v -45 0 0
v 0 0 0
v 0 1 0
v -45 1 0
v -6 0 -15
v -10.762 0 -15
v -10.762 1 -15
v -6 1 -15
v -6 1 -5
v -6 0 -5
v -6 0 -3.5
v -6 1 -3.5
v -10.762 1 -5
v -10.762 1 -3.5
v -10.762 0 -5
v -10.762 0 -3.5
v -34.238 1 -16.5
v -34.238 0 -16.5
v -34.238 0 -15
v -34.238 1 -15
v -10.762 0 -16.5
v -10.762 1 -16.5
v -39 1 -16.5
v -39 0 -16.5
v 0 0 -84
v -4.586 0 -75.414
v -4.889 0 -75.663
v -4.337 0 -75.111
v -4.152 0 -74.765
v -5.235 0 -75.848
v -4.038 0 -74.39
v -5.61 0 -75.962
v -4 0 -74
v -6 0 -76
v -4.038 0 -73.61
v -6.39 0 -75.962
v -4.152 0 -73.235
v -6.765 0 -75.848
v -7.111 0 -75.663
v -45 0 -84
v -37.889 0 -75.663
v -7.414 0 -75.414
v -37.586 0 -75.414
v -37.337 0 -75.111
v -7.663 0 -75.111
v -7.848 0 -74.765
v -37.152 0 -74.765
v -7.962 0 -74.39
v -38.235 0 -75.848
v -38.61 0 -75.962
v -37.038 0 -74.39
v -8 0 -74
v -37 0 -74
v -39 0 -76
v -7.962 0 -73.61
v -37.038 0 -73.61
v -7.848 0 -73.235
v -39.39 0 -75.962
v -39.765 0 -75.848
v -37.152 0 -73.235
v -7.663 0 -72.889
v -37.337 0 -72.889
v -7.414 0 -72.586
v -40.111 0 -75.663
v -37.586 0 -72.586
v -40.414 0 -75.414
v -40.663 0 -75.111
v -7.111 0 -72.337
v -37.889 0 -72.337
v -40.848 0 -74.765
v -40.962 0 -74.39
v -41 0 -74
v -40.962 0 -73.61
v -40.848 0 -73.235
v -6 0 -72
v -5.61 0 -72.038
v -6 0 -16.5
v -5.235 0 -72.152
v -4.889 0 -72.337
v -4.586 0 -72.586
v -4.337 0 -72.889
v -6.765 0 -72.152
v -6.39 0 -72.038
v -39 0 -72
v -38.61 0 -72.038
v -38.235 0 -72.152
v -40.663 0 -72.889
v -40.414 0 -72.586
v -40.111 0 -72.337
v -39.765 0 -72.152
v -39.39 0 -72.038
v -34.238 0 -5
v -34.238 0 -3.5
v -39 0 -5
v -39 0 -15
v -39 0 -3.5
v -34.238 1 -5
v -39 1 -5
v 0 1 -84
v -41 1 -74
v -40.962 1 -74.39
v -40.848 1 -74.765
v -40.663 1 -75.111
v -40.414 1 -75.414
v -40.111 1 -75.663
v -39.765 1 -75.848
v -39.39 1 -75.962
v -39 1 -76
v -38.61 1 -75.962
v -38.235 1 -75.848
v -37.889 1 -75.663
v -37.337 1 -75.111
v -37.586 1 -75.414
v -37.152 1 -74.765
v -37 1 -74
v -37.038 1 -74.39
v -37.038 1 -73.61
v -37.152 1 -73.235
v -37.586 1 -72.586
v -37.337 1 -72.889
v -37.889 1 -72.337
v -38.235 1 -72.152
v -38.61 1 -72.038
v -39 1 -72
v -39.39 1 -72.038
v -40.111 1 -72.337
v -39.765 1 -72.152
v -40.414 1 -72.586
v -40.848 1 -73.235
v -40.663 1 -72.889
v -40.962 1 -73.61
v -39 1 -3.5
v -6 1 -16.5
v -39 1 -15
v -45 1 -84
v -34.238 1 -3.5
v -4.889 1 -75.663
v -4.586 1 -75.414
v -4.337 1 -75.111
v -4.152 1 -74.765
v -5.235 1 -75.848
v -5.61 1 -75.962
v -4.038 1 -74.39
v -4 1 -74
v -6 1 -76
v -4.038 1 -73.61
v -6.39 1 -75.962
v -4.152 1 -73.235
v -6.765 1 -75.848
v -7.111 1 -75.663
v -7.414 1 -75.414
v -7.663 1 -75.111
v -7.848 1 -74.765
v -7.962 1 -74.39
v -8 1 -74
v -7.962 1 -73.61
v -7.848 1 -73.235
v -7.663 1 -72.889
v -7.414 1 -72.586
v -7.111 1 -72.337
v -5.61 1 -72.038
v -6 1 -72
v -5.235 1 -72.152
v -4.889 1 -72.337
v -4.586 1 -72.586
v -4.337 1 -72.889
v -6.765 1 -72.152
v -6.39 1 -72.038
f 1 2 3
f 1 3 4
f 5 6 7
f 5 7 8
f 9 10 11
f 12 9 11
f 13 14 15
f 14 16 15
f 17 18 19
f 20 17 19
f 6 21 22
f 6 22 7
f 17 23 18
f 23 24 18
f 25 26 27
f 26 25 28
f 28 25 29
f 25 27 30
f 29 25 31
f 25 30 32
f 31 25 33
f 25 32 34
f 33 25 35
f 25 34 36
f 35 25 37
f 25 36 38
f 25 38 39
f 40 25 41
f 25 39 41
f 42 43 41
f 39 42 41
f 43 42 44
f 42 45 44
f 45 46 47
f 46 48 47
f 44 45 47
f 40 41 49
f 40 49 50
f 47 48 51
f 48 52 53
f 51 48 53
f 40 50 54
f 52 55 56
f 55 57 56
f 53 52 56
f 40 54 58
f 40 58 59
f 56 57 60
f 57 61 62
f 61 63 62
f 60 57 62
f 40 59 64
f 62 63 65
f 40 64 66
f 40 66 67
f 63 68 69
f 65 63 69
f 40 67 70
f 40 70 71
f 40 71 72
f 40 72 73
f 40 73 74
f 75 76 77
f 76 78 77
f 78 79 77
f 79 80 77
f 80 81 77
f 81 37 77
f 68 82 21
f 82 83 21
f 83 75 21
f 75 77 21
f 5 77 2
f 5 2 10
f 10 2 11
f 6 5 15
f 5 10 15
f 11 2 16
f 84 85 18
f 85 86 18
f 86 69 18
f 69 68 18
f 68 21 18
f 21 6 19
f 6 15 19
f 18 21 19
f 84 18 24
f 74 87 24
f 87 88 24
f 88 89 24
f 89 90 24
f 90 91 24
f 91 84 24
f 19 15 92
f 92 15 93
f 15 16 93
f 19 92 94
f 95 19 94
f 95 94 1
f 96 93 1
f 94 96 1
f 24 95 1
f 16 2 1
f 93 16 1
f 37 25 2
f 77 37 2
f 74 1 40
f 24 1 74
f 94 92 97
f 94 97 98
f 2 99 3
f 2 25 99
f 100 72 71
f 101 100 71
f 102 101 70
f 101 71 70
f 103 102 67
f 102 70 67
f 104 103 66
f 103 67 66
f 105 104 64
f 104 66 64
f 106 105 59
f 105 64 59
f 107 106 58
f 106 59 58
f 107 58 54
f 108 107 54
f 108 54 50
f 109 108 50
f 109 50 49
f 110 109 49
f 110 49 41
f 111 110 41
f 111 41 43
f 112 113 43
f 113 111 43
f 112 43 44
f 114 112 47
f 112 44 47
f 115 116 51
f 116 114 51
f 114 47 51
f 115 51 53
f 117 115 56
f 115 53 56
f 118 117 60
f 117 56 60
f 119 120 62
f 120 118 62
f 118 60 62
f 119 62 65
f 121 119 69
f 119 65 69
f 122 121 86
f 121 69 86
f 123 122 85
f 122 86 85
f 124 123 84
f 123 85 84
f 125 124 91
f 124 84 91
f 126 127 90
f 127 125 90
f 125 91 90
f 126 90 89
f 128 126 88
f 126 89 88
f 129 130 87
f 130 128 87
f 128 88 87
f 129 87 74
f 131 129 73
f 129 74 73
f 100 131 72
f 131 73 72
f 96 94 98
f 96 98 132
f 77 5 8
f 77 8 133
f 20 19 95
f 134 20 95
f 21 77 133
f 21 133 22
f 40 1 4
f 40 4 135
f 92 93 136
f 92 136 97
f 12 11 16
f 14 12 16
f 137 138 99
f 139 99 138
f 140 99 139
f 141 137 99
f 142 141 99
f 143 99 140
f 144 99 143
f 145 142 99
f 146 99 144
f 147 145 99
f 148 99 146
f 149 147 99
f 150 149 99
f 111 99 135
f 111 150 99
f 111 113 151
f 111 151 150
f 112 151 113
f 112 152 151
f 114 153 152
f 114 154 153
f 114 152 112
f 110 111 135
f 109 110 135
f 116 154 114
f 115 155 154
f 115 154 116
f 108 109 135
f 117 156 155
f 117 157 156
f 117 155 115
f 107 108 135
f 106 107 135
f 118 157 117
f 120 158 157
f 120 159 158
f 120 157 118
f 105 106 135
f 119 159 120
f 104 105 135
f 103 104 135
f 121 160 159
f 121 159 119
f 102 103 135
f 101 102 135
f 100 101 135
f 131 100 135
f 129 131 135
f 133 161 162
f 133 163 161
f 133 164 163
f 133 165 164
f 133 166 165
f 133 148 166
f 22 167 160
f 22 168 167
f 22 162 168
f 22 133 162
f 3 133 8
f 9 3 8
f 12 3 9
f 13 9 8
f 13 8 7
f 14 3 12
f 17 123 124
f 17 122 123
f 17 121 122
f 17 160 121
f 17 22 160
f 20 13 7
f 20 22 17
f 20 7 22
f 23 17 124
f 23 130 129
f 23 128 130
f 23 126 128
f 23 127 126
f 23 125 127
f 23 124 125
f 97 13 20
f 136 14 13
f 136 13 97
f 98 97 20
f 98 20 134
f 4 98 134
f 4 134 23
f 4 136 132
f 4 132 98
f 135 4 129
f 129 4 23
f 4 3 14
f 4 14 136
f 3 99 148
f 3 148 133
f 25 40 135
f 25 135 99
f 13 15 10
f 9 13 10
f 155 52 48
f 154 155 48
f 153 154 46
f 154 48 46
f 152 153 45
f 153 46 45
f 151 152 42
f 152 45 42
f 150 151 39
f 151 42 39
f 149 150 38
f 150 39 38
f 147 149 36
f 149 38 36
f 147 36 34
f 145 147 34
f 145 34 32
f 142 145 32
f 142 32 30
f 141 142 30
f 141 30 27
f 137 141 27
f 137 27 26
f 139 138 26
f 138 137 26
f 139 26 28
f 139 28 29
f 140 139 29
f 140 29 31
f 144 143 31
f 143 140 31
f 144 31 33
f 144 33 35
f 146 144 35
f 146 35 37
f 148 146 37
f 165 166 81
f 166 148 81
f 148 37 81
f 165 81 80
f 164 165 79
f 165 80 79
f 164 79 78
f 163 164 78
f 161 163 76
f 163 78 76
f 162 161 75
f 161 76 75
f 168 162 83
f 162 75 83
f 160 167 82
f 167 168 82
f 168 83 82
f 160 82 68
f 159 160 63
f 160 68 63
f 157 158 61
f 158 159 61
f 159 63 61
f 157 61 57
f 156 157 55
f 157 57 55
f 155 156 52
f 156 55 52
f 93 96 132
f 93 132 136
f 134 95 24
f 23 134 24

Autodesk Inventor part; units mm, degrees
ref_plane "YZ Plane" through (0, 0, 0) normal (1, 0, 0) x (0, 1, 0)
ref_plane "XZ Plane" through (0, 0, 0) normal (0, 1, 0) x (-1, 0, 0)
ref_plane "XY Plane" through (0, 0, 0) normal (0, 0, 1) x (1, 0, 0)
sketch "Sketch1" plane through (0, 0, 0) normal (0, 1, 0) x (-1, 0, 0)
  line L0 (0, 0) -> (45, 0)
  line L1 (45, 0) -> (45, -84)
  line L2 (45, -84) -> (0, -84)
  line L3 (0, -84) -> (0, 0)
  line L4 (0, 0) -> (45, 0)
  line L5 (0, 2) -> (0, 0)
  circle A0 centre (6, -74) radius 2
  circle A1 centre (39, -74) radius 2
  line L6 (22.5, 0) -> (22.5, -84)
  line L7 (45, -10) -> (0, -10)
  line L8 (6, -3.5) -> (10.7625, -3.5)
  line L9 (10.7625, -3.5) -> (10.7625, -5)
  line L10 (10.7625, -5) -> (6, -5)
  line L11 (6, -5) -> (6, -3.5)
  line L12 (6, -16.5) -> (10.7625, -16.5)
  line L13 (10.7625, -16.5) -> (10.7625, -15)
  line L14 (10.7625, -15) -> (6, -15)
  line L15 (6, -15) -> (6, -16.5)
  line L16 (39, -3.5) -> (34.2375, -3.5)
  line L17 (34.2375, -3.5) -> (34.2375, -5)
  line L18 (34.2375, -5) -> (39, -5)
  line L19 (39, -5) -> (39, -3.5)
  line L20 (34.2375, -16.5) -> (34.2375, -15)
  line L21 (39, -15) -> (39, -16.5)
  line L22 (39, -16.5) -> (34.2375, -16.5)
  line L23 (34.2375, -15) -> (39, -15)
  dimension "d0" = 45
  dimension "d1" = 84
  dimension "d3" = 10
  dimension "d4" = 6
  dimension "d5" = 10
  dimension "d6" = 6
  dimension "d7" = 4
  dimension "d8" = 4
  dimension "d19" = 20
  dimension "d20" = 6
  dimension "d21" = 10
  dimension "d22" = 1.5
extrude "Extrusion4" add sketch "Sketch1" along normal blind 1
properties part number "Platte1_2"
